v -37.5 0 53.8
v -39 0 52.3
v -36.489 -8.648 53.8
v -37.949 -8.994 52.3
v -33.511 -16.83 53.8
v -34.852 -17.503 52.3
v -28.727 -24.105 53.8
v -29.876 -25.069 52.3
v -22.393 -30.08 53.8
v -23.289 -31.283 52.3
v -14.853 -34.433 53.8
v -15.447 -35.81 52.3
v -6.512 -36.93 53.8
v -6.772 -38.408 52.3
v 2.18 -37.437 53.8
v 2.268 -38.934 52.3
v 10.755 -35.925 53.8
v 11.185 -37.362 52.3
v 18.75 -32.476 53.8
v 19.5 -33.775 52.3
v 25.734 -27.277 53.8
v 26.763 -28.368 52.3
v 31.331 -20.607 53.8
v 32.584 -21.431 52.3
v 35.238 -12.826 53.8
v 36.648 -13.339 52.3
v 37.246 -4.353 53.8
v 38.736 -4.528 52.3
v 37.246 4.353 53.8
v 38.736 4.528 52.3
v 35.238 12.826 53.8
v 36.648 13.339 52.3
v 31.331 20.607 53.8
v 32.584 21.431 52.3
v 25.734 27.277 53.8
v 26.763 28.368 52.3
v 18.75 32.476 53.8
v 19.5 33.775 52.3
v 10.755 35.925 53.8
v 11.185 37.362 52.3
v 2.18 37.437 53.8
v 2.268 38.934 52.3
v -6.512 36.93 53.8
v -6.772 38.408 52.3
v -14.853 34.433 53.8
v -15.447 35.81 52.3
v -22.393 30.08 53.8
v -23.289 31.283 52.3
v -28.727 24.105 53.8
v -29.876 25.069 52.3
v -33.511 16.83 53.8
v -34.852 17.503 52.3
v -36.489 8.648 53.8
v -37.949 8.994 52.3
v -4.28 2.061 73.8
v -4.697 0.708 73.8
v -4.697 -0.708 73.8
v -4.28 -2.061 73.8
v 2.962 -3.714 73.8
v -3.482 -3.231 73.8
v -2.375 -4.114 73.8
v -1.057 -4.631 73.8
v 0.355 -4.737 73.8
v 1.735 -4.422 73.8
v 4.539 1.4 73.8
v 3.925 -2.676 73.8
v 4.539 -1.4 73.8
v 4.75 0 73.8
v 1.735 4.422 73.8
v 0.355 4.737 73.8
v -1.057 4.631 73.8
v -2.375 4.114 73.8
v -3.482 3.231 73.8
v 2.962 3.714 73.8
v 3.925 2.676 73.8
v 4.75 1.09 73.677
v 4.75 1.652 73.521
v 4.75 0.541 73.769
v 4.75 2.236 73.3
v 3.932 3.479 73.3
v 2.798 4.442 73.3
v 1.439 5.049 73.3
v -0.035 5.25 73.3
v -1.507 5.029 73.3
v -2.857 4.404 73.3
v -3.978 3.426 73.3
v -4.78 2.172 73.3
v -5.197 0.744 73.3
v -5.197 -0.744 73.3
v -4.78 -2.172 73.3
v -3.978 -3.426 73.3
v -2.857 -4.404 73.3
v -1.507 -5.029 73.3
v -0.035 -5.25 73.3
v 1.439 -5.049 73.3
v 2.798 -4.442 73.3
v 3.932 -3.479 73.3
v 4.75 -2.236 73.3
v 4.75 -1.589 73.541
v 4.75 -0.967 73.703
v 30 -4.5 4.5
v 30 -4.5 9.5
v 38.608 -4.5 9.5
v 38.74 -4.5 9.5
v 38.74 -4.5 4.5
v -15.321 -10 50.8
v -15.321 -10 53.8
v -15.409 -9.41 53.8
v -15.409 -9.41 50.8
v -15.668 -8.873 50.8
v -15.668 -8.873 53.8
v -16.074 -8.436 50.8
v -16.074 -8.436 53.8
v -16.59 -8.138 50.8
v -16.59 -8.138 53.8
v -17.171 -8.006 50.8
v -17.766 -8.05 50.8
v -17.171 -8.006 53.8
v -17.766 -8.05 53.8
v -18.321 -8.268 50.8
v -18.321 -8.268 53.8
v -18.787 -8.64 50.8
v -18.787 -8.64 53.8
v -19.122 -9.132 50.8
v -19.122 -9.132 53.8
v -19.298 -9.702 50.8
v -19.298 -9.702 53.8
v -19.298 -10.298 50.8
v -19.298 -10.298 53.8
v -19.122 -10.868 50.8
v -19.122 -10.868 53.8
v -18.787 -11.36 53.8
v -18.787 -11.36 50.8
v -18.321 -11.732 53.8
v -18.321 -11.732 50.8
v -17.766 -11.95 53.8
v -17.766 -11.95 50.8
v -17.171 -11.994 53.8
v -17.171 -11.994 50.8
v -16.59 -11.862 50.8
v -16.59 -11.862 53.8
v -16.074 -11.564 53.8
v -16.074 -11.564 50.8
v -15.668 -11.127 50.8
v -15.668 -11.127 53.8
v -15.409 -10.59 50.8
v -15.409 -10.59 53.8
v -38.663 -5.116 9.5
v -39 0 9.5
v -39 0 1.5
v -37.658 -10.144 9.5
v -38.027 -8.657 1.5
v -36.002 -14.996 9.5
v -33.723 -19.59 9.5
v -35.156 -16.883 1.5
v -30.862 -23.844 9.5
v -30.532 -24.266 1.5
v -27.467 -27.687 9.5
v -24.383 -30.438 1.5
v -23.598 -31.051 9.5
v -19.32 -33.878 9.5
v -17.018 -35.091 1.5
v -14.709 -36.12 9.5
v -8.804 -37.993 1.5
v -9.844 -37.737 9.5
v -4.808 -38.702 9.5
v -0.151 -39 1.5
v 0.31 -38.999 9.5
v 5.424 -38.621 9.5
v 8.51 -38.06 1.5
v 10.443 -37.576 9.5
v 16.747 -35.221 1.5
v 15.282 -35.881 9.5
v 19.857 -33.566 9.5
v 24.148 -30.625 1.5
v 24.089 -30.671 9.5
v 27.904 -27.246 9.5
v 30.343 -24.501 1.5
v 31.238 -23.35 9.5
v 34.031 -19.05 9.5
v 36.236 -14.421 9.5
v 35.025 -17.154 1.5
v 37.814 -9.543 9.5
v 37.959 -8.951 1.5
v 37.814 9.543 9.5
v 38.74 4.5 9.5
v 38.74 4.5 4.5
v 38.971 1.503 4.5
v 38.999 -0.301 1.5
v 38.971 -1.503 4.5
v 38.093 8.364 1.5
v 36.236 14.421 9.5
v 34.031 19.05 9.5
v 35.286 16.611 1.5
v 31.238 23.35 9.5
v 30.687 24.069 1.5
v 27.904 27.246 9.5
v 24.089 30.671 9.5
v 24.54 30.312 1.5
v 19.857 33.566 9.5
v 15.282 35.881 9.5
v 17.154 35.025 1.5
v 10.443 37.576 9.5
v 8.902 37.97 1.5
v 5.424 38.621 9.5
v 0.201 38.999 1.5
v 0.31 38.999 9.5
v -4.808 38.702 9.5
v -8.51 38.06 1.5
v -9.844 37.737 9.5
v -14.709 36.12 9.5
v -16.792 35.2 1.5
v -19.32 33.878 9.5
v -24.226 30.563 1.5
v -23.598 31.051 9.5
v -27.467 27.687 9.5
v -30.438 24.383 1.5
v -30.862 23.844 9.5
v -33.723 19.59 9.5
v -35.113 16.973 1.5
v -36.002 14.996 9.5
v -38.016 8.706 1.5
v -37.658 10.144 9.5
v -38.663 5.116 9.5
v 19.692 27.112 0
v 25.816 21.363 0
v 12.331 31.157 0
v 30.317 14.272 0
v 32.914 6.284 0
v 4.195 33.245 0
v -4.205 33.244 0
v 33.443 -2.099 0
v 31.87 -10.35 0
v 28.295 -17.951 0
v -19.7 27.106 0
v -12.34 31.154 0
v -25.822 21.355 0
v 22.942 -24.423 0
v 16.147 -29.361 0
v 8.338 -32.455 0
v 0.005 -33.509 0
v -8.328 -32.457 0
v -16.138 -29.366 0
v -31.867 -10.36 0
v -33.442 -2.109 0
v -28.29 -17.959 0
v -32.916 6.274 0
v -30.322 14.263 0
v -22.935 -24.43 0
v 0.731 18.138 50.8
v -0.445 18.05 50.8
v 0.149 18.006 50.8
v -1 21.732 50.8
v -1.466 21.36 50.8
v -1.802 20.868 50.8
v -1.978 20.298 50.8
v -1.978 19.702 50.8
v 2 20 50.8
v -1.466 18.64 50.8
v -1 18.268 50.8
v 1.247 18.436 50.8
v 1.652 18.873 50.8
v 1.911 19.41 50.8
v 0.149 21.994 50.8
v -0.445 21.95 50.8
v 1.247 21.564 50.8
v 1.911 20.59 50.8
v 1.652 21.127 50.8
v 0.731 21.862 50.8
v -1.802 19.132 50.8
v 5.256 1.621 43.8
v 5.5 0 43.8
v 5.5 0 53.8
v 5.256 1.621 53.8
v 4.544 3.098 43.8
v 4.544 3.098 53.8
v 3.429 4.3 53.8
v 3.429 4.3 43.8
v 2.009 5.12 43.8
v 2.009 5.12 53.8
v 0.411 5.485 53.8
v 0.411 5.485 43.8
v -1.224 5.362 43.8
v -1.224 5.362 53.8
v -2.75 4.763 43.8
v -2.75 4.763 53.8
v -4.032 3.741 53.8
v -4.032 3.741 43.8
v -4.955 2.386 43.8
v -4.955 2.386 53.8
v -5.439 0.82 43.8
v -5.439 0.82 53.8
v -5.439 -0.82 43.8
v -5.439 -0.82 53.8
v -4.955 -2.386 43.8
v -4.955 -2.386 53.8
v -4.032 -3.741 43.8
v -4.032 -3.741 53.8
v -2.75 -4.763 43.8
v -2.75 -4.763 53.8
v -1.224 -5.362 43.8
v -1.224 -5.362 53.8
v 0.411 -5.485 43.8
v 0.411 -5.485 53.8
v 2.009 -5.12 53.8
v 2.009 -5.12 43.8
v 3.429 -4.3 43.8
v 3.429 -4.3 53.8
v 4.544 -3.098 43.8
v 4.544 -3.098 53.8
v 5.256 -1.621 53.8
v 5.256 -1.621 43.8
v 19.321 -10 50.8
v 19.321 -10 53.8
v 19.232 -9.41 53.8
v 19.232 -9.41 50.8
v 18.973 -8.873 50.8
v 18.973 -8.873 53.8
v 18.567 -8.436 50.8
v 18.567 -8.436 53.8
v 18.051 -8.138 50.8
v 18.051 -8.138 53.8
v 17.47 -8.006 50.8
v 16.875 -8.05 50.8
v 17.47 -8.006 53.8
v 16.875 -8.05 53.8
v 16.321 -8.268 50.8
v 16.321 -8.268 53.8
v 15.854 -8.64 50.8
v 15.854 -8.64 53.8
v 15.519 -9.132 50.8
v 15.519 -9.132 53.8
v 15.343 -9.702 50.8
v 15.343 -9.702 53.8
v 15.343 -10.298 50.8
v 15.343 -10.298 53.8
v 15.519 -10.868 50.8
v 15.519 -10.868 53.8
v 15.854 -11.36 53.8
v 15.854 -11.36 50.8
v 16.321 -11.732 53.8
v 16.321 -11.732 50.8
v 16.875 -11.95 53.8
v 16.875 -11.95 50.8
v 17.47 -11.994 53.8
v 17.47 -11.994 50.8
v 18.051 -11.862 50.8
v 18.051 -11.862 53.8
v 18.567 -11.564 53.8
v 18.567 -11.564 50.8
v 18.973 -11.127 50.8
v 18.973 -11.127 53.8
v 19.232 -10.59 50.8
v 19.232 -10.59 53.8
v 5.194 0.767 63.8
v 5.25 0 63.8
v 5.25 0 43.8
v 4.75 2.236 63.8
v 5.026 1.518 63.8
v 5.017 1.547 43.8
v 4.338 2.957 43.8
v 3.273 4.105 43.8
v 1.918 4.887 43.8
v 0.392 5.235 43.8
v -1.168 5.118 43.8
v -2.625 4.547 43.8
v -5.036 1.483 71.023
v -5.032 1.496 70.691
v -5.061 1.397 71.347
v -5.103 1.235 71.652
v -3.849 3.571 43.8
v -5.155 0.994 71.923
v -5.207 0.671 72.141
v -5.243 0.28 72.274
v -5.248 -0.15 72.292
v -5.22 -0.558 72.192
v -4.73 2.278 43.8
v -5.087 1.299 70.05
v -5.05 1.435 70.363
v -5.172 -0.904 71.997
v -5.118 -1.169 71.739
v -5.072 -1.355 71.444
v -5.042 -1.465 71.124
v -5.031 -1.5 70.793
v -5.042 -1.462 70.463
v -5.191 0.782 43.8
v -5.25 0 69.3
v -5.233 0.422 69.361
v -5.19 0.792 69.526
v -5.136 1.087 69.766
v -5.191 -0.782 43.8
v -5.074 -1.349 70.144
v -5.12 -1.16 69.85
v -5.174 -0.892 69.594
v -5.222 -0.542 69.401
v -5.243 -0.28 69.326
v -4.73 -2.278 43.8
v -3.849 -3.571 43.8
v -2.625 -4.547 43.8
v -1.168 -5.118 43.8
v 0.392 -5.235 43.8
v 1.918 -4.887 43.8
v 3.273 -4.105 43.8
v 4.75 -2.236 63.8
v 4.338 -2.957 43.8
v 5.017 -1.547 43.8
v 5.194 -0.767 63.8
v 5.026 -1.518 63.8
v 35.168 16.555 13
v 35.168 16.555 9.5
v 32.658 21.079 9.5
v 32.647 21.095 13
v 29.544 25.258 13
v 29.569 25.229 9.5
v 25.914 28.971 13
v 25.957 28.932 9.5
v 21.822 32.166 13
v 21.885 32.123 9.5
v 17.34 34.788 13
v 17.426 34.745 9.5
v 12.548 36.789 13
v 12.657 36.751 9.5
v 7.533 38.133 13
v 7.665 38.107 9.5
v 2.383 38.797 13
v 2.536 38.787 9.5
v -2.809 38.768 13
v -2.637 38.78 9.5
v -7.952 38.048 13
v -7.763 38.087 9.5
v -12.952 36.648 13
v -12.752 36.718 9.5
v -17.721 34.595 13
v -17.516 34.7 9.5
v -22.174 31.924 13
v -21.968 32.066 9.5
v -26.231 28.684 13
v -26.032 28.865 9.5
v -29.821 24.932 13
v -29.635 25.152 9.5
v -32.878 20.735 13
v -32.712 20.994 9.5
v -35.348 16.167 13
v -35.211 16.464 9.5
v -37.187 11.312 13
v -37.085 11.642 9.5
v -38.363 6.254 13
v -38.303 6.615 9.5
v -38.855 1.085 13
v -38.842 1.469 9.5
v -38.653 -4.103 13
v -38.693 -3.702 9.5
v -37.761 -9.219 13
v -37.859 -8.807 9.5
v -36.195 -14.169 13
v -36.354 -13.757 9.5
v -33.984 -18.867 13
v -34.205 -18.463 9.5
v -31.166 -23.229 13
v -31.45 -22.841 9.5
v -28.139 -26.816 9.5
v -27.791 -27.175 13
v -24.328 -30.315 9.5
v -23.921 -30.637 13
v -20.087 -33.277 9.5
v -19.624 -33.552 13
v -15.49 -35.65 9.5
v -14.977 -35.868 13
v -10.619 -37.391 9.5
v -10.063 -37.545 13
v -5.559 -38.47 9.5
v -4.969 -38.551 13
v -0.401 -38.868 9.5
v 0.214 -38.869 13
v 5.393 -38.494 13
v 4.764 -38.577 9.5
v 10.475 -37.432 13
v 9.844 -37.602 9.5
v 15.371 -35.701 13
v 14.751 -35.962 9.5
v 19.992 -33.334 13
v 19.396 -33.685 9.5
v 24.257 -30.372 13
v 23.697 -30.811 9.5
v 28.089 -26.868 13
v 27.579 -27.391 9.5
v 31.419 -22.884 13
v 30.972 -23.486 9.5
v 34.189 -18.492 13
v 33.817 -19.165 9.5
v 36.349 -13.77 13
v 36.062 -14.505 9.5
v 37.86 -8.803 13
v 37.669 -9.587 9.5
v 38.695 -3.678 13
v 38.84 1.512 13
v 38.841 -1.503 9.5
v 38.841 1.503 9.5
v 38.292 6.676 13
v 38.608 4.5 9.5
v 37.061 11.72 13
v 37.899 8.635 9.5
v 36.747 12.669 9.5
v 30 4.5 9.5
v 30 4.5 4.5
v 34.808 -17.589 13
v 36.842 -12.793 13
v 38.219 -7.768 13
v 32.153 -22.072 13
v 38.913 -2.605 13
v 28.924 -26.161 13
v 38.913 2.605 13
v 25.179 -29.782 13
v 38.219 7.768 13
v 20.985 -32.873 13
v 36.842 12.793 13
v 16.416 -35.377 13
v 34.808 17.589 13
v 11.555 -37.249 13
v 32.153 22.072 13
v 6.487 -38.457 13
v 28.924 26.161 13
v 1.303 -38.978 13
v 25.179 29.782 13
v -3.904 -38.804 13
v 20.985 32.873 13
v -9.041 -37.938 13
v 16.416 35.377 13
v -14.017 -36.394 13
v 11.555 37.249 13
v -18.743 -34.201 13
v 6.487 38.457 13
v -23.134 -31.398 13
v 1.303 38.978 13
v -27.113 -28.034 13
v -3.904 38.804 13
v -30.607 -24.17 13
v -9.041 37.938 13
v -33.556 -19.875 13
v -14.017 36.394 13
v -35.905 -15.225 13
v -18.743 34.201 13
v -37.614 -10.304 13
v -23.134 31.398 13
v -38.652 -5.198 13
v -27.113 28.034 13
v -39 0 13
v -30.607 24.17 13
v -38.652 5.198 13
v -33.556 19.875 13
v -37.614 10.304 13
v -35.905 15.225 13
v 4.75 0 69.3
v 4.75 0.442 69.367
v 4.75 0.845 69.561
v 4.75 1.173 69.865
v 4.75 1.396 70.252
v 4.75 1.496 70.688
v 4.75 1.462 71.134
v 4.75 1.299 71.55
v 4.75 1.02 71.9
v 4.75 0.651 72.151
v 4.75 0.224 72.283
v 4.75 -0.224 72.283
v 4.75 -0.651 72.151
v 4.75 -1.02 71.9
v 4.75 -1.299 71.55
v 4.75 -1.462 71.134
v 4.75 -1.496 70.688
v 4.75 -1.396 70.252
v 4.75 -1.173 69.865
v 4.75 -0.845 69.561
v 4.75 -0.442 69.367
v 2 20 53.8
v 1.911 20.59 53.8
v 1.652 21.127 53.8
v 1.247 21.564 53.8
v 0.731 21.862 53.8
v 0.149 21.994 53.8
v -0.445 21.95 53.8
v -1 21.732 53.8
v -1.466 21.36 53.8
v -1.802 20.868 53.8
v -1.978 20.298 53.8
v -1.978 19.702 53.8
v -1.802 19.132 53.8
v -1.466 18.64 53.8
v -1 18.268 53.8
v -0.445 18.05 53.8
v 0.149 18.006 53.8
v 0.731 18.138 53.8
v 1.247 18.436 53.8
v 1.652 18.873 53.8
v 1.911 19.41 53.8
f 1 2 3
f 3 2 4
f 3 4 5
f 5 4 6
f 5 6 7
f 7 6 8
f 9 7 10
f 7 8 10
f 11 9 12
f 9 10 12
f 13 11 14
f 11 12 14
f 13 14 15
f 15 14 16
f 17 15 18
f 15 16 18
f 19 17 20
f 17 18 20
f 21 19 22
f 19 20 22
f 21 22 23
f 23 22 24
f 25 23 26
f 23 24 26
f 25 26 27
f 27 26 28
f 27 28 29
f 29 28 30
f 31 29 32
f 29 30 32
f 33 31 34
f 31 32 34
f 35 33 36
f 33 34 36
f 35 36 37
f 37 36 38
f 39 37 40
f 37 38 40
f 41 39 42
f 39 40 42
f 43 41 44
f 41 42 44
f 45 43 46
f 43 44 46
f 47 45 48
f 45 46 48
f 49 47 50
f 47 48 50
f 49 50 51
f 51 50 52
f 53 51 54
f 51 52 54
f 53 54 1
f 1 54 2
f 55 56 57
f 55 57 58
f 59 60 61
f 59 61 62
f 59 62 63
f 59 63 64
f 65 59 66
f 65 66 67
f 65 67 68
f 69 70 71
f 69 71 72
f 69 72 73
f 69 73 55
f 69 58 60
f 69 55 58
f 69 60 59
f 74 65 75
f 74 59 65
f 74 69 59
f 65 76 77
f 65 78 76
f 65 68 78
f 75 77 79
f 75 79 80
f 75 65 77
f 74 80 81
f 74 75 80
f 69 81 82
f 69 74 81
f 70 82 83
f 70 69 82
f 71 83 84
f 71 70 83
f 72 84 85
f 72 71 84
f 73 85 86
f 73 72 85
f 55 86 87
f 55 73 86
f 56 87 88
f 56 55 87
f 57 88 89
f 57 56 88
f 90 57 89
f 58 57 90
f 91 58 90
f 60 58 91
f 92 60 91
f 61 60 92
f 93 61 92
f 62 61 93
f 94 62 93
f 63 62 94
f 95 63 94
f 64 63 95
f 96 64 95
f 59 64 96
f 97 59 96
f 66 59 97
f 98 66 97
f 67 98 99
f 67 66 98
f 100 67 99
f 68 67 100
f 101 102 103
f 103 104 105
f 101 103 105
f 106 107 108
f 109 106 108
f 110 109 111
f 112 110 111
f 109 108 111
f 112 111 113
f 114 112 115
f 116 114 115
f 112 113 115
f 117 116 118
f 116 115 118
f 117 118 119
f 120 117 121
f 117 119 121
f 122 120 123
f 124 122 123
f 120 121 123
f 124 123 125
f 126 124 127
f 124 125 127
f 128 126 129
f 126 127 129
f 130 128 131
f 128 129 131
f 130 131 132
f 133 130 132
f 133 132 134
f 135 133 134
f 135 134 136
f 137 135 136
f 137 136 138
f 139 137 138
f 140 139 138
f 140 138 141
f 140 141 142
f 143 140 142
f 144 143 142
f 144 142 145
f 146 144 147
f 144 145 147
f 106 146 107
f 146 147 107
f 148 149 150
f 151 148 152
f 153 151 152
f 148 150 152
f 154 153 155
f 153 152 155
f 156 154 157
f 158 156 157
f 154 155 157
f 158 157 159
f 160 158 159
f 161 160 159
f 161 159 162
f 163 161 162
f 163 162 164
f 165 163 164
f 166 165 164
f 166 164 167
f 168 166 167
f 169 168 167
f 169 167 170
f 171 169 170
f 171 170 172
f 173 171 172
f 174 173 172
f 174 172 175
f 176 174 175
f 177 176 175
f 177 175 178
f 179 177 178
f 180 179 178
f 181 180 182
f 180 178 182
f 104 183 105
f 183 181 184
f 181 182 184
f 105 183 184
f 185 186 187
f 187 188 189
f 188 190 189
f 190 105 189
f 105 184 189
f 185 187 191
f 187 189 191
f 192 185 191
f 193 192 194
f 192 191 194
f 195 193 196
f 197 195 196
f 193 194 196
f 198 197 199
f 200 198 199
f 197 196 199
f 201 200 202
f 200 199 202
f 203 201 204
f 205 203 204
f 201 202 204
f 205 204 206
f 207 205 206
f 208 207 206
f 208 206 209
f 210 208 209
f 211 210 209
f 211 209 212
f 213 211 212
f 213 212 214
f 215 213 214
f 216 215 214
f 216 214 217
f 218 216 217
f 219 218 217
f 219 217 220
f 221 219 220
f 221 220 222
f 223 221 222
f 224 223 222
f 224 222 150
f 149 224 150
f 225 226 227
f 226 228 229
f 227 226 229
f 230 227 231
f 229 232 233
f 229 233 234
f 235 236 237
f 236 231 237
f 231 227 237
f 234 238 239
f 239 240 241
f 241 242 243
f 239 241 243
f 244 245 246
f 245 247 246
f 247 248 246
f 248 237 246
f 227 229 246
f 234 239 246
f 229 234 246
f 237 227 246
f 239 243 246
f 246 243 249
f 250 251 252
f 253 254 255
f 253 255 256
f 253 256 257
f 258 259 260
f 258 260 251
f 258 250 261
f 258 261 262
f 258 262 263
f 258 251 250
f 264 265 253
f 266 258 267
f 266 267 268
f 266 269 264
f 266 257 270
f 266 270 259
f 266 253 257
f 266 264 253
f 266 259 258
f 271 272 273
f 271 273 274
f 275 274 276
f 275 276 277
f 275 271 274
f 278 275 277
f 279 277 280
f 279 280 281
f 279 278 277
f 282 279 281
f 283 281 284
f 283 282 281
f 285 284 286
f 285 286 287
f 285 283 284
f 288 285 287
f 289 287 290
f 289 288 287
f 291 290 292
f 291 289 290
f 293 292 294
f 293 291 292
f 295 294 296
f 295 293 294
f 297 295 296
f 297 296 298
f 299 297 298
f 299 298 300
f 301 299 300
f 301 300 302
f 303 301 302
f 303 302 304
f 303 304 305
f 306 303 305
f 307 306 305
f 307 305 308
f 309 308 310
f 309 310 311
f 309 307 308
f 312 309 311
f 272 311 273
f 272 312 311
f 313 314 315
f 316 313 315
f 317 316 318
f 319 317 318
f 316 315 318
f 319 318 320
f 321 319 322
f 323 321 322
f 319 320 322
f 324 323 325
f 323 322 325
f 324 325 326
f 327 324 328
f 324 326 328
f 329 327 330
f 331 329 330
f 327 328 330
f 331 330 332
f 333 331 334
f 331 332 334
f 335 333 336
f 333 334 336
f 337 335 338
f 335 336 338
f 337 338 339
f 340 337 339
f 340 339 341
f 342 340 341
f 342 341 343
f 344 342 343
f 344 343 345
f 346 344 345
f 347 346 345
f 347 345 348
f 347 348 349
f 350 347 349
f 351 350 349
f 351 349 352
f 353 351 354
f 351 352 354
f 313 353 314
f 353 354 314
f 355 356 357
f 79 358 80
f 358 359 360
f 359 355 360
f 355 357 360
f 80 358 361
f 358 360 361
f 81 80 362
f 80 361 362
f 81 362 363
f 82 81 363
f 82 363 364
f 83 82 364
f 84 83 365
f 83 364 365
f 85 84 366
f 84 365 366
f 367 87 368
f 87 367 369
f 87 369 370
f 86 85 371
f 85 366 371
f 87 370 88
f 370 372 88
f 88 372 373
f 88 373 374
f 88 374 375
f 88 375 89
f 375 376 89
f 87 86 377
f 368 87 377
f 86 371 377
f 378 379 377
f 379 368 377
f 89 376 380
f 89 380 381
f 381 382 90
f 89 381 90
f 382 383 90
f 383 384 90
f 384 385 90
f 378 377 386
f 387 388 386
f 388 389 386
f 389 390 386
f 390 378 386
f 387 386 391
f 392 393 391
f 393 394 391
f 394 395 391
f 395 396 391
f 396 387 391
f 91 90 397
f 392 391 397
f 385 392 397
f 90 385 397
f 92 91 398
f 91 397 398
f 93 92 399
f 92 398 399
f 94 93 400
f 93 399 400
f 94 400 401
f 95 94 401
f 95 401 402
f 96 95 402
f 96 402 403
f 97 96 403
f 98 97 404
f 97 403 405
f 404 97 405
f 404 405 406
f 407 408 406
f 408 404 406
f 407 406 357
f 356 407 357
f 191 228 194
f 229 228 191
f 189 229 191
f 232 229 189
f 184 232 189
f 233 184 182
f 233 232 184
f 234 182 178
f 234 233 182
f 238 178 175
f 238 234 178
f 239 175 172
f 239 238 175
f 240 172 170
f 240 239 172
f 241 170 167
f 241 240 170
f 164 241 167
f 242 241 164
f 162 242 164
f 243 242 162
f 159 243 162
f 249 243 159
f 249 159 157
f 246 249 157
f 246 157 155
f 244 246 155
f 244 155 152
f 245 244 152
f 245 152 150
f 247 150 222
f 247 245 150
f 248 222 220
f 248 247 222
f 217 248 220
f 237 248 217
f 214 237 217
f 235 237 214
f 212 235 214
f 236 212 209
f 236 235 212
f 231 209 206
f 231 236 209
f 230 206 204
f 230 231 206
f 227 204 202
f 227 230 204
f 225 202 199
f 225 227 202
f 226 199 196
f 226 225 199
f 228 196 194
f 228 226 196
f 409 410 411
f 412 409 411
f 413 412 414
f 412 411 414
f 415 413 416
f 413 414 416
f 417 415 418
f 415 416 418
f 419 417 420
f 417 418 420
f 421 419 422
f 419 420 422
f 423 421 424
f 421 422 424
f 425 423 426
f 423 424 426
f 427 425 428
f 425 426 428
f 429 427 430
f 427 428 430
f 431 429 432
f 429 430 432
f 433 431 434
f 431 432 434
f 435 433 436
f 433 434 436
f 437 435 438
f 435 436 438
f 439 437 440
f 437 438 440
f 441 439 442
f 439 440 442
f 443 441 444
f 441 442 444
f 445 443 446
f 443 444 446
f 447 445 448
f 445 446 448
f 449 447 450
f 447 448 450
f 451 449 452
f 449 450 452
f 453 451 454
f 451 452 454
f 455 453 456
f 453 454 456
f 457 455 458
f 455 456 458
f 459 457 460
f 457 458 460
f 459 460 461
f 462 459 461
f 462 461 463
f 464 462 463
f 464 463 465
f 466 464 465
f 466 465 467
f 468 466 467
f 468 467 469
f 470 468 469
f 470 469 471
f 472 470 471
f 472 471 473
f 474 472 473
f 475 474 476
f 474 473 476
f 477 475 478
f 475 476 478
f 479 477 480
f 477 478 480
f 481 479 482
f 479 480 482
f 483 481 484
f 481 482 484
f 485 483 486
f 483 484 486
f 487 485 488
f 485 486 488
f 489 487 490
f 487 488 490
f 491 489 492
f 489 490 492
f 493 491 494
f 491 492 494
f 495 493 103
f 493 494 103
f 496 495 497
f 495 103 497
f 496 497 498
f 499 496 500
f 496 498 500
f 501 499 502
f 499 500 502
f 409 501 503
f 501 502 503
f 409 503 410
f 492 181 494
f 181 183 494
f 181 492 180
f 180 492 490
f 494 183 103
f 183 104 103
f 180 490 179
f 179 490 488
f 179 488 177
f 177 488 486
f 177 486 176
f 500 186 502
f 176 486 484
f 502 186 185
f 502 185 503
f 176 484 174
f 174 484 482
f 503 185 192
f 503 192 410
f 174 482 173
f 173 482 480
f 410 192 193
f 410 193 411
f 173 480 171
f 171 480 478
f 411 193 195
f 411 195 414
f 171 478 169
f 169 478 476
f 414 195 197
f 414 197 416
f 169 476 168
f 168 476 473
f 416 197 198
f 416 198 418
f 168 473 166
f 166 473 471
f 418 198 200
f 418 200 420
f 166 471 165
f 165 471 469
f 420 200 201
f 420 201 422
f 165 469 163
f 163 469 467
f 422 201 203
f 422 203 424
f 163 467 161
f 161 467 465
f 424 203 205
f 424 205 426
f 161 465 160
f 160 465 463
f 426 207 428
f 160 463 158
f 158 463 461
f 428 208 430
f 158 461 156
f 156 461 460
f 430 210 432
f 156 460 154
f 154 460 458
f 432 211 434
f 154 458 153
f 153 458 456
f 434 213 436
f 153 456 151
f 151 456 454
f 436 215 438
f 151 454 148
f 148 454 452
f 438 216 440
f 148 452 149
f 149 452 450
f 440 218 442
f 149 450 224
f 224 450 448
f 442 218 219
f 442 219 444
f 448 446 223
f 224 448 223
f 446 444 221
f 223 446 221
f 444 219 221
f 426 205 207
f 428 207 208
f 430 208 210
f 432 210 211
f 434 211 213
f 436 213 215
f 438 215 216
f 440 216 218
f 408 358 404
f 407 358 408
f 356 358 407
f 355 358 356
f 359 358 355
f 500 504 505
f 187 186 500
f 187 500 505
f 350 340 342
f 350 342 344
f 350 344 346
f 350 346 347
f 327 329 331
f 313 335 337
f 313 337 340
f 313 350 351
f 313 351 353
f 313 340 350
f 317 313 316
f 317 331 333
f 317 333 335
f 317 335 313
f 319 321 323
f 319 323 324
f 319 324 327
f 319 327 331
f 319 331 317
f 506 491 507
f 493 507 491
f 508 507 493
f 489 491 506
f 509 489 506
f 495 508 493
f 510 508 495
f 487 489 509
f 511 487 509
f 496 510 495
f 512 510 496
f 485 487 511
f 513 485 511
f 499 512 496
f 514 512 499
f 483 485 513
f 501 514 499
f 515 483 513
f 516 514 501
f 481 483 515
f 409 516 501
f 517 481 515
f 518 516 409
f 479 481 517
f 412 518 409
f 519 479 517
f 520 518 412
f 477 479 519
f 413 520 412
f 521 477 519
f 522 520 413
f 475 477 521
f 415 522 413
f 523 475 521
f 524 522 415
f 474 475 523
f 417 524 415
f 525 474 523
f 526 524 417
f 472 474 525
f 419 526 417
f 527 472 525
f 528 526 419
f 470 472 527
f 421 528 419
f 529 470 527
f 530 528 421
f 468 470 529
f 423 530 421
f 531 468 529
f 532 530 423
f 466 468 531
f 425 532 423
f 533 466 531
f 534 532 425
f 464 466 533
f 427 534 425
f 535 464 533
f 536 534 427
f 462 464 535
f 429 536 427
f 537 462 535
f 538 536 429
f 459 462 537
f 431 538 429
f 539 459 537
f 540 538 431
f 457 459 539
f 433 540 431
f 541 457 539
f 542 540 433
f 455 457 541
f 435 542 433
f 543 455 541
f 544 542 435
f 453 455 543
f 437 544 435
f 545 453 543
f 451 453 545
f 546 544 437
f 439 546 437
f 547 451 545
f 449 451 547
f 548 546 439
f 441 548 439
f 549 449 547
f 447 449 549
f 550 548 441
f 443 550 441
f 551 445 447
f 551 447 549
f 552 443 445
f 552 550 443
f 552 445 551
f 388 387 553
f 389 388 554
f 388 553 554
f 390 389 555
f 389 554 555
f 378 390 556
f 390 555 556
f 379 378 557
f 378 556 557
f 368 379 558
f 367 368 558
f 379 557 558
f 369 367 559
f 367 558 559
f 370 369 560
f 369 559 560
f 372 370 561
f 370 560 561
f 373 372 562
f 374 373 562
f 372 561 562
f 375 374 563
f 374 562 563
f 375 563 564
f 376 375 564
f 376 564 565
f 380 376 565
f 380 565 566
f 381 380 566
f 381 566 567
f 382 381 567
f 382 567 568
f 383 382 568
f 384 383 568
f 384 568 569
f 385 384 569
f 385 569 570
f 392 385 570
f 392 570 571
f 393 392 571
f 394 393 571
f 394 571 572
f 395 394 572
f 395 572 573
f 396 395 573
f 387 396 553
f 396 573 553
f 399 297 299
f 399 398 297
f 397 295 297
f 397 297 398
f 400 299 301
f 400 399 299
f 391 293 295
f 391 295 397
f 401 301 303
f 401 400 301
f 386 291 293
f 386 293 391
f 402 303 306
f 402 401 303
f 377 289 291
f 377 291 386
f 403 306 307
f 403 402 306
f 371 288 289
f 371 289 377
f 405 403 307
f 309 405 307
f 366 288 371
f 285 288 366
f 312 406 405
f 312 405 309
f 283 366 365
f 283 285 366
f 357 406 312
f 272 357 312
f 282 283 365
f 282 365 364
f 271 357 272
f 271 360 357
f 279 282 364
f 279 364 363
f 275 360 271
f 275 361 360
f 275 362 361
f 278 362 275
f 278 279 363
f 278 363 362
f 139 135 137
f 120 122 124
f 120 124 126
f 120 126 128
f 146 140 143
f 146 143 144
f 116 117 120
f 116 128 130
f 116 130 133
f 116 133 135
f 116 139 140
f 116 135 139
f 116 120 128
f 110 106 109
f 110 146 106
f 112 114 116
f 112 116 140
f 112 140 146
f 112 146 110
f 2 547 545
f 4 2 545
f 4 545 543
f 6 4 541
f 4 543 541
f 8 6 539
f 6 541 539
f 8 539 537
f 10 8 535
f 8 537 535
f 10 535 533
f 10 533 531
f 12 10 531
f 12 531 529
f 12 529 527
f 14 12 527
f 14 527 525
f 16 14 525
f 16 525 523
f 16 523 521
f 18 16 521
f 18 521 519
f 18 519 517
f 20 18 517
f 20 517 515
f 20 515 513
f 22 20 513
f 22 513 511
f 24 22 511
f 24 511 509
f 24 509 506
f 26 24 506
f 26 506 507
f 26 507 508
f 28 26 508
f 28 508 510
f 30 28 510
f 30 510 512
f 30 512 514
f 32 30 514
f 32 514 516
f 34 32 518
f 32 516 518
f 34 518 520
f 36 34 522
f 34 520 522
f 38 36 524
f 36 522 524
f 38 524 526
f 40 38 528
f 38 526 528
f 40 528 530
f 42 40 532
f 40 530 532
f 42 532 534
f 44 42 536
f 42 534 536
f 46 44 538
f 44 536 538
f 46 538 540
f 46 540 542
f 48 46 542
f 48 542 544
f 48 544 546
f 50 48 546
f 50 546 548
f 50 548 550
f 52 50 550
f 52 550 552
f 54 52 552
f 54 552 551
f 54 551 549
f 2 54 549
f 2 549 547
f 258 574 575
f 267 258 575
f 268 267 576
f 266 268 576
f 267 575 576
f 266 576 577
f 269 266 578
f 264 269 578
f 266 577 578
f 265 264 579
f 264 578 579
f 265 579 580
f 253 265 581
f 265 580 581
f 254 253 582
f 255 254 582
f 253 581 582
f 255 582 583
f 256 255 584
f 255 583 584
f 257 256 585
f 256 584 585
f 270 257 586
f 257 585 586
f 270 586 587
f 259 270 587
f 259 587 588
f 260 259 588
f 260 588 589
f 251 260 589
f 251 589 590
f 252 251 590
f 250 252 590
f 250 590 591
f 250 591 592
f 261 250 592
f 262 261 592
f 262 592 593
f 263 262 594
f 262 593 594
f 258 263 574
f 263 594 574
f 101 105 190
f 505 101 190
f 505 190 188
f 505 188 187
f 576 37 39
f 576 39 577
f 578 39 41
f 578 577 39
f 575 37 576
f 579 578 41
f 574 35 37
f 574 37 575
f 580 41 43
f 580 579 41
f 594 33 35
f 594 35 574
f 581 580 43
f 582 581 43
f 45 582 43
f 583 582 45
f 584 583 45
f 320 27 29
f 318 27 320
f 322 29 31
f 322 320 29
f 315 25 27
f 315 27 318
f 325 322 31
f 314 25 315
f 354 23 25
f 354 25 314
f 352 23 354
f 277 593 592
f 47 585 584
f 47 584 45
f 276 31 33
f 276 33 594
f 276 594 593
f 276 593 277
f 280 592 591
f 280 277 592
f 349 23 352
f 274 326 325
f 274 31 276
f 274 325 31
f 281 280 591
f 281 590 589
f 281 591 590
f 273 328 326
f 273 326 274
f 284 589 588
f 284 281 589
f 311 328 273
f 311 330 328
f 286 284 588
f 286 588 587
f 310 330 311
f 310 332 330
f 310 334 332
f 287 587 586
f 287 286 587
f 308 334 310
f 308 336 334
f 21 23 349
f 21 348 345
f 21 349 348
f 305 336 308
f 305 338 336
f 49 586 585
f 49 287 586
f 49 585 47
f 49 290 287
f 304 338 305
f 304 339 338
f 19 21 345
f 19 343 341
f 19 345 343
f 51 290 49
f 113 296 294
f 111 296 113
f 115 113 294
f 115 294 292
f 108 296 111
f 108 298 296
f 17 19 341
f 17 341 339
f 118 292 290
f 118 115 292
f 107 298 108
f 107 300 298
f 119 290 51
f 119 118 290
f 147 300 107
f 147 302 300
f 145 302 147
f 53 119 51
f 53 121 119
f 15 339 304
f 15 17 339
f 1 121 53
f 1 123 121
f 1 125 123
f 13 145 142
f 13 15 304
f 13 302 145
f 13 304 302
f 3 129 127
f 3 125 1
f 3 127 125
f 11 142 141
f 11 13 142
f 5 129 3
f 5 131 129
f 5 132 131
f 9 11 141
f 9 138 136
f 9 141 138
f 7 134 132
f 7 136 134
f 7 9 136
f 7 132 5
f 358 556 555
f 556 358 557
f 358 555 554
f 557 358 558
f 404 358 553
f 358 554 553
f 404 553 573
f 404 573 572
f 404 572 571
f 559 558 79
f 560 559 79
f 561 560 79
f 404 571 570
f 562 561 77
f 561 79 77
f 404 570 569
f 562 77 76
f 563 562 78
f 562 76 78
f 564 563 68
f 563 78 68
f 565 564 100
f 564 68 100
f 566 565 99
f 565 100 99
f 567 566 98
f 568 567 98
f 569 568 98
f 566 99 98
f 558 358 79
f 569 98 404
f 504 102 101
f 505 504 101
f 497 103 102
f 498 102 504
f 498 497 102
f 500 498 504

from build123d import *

# Parameters (mm, degrees)
SKETCH_1_R          = 39
EXTRUDE_1_DEPTH     = 53.8
SKETCH_2_R          = 2
CUT_EXTRUDE_1_DEPTH = 3
SKETCH_3_R          = 5.25
EXTRUDE_2_DEPTH     = 20
CUT_EXTRUDE_START   = -10
SKETCH_4_R          = 5.5
SKETCH_4_R_2        = 5.25
CUT_EXTRUDE_2_DEPTH = 10
CHAMFER_1_SIZE      = 0.5
CUT_EXTRUDE_3_DEPTH = 10
CHAMFER_2_SIZE      = 1.5
SKETCH_7_W          = 5
SKETCH_7_H          = 9
CUT_EXTRUDE_4_DEPTH = 10
SKETCH_8_W          = 0.130242645
SKETCH_8_H          = 3.5
SKETCH_9_R          = 1.5
CUT_EXTRUDE_5_DEPTH = 10


with BuildPart() as part:
    # 草图1 → 凸台-拉伸1 (new body)
    with BuildSketch(Plane.XY):
        with Locations(Location((0, 0, 0), (0, 0, 180))):
            Circle(SKETCH_1_R)
    extrude(amount=EXTRUDE_1_DEPTH)

    # 草图2 → 切除-拉伸1 (cut)
    with BuildSketch(Plane.XY.offset(53.8)):
        with Locations((0, 20)):
            Circle(SKETCH_2_R)
        with Locations((17.320508076, -10)):
            Circle(SKETCH_2_R)
        with Locations((-17.320508076, -10)):
            Circle(SKETCH_2_R)
    extrude(amount=-CUT_EXTRUDE_1_DEPTH, mode=Mode.SUBTRACT)

    # 草图3 → 凸台-拉伸2 (add)
    with BuildSketch(Plane.XY.offset(53.8)):
        Circle(SKETCH_3_R)
    extrude(amount=EXTRUDE_2_DEPTH)

    # 草图4 → 切除-拉伸2 (cut)
    with BuildSketch(Plane.XY.offset(53.8).offset(CUT_EXTRUDE_START)):
        Circle(SKETCH_4_R)
        Circle(SKETCH_4_R_2, mode=Mode.SUBTRACT)
    extrude(amount=CUT_EXTRUDE_2_DEPTH, mode=Mode.SUBTRACT)

    # 倒角1
    chamfer_1_edges = [part.edges().sort_by_distance(p)[0] for p in [
        (-5.25, 0, 73.8),
    ]]
    chamfer(chamfer_1_edges, length=CHAMFER_1_SIZE)

    # 草图5 → 切除-拉伸3 (cut)
    with BuildSketch(Plane.XY.offset(73.8)):
        Polygon((4.75, 0), (4.75, 11.306536843), (10.594936623, 11.306536843), (10.594936623, -9.408936254), (4.75, -9.408936254), align=None)
    extrude(amount=-CUT_EXTRUDE_3_DEPTH, mode=Mode.SUBTRACT)

    # 倒角2
    chamfer_2_edges = [part.edges().sort_by_distance(p)[0] for p in [
        (39, 0, 53.8),
    ]]
    chamfer(chamfer_2_edges, length=CHAMFER_2_SIZE)

    # 草图6 → 切除-旋转1 (revolve, cut)
    with BuildSketch(Plane(origin=(0, 0, 0), x_dir=(1, 0, 0), z_dir=(0, 1, 0)), mode=Mode.PRIVATE) as cut_revolve_1_sk:
        Polygon((-39, 0), (-39, -1.5), (-33.508685112, 0), align=None)
    revolve(cut_revolve_1_sk.sketch.rotate(Axis((0, 0, 0), (0, 0, -1)), 154.791234703), axis=Axis((0, 0, 0), (0, 0, -1)), mode=Mode.SUBTRACT)

    # 草图7 → 切除-拉伸4 (cut)
    with BuildSketch(Plane(origin=(40, 0, 0), x_dir=(0, 0, -1), z_dir=(1, 0, 0))):
        with Locations((-7, 0)):
            Rectangle(SKETCH_7_W, SKETCH_7_H)
    extrude(amount=-CUT_EXTRUDE_4_DEPTH, mode=Mode.SUBTRACT)

    # 草图8 → 切除-旋转2 (revolve, cut)
    with BuildSketch(Plane(origin=(0, 0, 0), x_dir=(1, 0, 0), z_dir=(0, 1, 0)), mode=Mode.PRIVATE) as cut_revolve_2_sk:
        with Locations((38.934878678, -11.25)):
            Rectangle(SKETCH_8_W, SKETCH_8_H)
    revolve(cut_revolve_2_sk.sketch.rotate(Axis((0, 0, 0), (0, 0, 1)), 25.208765297), axis=Axis((0, 0, 0), (0, 0, 1)), mode=Mode.SUBTRACT)

    # 草图9 → 切除-拉伸5 (cut)
    with BuildSketch(Plane(origin=(4.75, 0, 0), x_dir=(0, 0, -1), z_dir=(1, 0, 0))):
        with Locations((-70.8, 0)):
            Circle(SKETCH_9_R)
    extrude(amount=-CUT_EXTRUDE_5_DEPTH, mode=Mode.SUBTRACT)


solid = part.part
